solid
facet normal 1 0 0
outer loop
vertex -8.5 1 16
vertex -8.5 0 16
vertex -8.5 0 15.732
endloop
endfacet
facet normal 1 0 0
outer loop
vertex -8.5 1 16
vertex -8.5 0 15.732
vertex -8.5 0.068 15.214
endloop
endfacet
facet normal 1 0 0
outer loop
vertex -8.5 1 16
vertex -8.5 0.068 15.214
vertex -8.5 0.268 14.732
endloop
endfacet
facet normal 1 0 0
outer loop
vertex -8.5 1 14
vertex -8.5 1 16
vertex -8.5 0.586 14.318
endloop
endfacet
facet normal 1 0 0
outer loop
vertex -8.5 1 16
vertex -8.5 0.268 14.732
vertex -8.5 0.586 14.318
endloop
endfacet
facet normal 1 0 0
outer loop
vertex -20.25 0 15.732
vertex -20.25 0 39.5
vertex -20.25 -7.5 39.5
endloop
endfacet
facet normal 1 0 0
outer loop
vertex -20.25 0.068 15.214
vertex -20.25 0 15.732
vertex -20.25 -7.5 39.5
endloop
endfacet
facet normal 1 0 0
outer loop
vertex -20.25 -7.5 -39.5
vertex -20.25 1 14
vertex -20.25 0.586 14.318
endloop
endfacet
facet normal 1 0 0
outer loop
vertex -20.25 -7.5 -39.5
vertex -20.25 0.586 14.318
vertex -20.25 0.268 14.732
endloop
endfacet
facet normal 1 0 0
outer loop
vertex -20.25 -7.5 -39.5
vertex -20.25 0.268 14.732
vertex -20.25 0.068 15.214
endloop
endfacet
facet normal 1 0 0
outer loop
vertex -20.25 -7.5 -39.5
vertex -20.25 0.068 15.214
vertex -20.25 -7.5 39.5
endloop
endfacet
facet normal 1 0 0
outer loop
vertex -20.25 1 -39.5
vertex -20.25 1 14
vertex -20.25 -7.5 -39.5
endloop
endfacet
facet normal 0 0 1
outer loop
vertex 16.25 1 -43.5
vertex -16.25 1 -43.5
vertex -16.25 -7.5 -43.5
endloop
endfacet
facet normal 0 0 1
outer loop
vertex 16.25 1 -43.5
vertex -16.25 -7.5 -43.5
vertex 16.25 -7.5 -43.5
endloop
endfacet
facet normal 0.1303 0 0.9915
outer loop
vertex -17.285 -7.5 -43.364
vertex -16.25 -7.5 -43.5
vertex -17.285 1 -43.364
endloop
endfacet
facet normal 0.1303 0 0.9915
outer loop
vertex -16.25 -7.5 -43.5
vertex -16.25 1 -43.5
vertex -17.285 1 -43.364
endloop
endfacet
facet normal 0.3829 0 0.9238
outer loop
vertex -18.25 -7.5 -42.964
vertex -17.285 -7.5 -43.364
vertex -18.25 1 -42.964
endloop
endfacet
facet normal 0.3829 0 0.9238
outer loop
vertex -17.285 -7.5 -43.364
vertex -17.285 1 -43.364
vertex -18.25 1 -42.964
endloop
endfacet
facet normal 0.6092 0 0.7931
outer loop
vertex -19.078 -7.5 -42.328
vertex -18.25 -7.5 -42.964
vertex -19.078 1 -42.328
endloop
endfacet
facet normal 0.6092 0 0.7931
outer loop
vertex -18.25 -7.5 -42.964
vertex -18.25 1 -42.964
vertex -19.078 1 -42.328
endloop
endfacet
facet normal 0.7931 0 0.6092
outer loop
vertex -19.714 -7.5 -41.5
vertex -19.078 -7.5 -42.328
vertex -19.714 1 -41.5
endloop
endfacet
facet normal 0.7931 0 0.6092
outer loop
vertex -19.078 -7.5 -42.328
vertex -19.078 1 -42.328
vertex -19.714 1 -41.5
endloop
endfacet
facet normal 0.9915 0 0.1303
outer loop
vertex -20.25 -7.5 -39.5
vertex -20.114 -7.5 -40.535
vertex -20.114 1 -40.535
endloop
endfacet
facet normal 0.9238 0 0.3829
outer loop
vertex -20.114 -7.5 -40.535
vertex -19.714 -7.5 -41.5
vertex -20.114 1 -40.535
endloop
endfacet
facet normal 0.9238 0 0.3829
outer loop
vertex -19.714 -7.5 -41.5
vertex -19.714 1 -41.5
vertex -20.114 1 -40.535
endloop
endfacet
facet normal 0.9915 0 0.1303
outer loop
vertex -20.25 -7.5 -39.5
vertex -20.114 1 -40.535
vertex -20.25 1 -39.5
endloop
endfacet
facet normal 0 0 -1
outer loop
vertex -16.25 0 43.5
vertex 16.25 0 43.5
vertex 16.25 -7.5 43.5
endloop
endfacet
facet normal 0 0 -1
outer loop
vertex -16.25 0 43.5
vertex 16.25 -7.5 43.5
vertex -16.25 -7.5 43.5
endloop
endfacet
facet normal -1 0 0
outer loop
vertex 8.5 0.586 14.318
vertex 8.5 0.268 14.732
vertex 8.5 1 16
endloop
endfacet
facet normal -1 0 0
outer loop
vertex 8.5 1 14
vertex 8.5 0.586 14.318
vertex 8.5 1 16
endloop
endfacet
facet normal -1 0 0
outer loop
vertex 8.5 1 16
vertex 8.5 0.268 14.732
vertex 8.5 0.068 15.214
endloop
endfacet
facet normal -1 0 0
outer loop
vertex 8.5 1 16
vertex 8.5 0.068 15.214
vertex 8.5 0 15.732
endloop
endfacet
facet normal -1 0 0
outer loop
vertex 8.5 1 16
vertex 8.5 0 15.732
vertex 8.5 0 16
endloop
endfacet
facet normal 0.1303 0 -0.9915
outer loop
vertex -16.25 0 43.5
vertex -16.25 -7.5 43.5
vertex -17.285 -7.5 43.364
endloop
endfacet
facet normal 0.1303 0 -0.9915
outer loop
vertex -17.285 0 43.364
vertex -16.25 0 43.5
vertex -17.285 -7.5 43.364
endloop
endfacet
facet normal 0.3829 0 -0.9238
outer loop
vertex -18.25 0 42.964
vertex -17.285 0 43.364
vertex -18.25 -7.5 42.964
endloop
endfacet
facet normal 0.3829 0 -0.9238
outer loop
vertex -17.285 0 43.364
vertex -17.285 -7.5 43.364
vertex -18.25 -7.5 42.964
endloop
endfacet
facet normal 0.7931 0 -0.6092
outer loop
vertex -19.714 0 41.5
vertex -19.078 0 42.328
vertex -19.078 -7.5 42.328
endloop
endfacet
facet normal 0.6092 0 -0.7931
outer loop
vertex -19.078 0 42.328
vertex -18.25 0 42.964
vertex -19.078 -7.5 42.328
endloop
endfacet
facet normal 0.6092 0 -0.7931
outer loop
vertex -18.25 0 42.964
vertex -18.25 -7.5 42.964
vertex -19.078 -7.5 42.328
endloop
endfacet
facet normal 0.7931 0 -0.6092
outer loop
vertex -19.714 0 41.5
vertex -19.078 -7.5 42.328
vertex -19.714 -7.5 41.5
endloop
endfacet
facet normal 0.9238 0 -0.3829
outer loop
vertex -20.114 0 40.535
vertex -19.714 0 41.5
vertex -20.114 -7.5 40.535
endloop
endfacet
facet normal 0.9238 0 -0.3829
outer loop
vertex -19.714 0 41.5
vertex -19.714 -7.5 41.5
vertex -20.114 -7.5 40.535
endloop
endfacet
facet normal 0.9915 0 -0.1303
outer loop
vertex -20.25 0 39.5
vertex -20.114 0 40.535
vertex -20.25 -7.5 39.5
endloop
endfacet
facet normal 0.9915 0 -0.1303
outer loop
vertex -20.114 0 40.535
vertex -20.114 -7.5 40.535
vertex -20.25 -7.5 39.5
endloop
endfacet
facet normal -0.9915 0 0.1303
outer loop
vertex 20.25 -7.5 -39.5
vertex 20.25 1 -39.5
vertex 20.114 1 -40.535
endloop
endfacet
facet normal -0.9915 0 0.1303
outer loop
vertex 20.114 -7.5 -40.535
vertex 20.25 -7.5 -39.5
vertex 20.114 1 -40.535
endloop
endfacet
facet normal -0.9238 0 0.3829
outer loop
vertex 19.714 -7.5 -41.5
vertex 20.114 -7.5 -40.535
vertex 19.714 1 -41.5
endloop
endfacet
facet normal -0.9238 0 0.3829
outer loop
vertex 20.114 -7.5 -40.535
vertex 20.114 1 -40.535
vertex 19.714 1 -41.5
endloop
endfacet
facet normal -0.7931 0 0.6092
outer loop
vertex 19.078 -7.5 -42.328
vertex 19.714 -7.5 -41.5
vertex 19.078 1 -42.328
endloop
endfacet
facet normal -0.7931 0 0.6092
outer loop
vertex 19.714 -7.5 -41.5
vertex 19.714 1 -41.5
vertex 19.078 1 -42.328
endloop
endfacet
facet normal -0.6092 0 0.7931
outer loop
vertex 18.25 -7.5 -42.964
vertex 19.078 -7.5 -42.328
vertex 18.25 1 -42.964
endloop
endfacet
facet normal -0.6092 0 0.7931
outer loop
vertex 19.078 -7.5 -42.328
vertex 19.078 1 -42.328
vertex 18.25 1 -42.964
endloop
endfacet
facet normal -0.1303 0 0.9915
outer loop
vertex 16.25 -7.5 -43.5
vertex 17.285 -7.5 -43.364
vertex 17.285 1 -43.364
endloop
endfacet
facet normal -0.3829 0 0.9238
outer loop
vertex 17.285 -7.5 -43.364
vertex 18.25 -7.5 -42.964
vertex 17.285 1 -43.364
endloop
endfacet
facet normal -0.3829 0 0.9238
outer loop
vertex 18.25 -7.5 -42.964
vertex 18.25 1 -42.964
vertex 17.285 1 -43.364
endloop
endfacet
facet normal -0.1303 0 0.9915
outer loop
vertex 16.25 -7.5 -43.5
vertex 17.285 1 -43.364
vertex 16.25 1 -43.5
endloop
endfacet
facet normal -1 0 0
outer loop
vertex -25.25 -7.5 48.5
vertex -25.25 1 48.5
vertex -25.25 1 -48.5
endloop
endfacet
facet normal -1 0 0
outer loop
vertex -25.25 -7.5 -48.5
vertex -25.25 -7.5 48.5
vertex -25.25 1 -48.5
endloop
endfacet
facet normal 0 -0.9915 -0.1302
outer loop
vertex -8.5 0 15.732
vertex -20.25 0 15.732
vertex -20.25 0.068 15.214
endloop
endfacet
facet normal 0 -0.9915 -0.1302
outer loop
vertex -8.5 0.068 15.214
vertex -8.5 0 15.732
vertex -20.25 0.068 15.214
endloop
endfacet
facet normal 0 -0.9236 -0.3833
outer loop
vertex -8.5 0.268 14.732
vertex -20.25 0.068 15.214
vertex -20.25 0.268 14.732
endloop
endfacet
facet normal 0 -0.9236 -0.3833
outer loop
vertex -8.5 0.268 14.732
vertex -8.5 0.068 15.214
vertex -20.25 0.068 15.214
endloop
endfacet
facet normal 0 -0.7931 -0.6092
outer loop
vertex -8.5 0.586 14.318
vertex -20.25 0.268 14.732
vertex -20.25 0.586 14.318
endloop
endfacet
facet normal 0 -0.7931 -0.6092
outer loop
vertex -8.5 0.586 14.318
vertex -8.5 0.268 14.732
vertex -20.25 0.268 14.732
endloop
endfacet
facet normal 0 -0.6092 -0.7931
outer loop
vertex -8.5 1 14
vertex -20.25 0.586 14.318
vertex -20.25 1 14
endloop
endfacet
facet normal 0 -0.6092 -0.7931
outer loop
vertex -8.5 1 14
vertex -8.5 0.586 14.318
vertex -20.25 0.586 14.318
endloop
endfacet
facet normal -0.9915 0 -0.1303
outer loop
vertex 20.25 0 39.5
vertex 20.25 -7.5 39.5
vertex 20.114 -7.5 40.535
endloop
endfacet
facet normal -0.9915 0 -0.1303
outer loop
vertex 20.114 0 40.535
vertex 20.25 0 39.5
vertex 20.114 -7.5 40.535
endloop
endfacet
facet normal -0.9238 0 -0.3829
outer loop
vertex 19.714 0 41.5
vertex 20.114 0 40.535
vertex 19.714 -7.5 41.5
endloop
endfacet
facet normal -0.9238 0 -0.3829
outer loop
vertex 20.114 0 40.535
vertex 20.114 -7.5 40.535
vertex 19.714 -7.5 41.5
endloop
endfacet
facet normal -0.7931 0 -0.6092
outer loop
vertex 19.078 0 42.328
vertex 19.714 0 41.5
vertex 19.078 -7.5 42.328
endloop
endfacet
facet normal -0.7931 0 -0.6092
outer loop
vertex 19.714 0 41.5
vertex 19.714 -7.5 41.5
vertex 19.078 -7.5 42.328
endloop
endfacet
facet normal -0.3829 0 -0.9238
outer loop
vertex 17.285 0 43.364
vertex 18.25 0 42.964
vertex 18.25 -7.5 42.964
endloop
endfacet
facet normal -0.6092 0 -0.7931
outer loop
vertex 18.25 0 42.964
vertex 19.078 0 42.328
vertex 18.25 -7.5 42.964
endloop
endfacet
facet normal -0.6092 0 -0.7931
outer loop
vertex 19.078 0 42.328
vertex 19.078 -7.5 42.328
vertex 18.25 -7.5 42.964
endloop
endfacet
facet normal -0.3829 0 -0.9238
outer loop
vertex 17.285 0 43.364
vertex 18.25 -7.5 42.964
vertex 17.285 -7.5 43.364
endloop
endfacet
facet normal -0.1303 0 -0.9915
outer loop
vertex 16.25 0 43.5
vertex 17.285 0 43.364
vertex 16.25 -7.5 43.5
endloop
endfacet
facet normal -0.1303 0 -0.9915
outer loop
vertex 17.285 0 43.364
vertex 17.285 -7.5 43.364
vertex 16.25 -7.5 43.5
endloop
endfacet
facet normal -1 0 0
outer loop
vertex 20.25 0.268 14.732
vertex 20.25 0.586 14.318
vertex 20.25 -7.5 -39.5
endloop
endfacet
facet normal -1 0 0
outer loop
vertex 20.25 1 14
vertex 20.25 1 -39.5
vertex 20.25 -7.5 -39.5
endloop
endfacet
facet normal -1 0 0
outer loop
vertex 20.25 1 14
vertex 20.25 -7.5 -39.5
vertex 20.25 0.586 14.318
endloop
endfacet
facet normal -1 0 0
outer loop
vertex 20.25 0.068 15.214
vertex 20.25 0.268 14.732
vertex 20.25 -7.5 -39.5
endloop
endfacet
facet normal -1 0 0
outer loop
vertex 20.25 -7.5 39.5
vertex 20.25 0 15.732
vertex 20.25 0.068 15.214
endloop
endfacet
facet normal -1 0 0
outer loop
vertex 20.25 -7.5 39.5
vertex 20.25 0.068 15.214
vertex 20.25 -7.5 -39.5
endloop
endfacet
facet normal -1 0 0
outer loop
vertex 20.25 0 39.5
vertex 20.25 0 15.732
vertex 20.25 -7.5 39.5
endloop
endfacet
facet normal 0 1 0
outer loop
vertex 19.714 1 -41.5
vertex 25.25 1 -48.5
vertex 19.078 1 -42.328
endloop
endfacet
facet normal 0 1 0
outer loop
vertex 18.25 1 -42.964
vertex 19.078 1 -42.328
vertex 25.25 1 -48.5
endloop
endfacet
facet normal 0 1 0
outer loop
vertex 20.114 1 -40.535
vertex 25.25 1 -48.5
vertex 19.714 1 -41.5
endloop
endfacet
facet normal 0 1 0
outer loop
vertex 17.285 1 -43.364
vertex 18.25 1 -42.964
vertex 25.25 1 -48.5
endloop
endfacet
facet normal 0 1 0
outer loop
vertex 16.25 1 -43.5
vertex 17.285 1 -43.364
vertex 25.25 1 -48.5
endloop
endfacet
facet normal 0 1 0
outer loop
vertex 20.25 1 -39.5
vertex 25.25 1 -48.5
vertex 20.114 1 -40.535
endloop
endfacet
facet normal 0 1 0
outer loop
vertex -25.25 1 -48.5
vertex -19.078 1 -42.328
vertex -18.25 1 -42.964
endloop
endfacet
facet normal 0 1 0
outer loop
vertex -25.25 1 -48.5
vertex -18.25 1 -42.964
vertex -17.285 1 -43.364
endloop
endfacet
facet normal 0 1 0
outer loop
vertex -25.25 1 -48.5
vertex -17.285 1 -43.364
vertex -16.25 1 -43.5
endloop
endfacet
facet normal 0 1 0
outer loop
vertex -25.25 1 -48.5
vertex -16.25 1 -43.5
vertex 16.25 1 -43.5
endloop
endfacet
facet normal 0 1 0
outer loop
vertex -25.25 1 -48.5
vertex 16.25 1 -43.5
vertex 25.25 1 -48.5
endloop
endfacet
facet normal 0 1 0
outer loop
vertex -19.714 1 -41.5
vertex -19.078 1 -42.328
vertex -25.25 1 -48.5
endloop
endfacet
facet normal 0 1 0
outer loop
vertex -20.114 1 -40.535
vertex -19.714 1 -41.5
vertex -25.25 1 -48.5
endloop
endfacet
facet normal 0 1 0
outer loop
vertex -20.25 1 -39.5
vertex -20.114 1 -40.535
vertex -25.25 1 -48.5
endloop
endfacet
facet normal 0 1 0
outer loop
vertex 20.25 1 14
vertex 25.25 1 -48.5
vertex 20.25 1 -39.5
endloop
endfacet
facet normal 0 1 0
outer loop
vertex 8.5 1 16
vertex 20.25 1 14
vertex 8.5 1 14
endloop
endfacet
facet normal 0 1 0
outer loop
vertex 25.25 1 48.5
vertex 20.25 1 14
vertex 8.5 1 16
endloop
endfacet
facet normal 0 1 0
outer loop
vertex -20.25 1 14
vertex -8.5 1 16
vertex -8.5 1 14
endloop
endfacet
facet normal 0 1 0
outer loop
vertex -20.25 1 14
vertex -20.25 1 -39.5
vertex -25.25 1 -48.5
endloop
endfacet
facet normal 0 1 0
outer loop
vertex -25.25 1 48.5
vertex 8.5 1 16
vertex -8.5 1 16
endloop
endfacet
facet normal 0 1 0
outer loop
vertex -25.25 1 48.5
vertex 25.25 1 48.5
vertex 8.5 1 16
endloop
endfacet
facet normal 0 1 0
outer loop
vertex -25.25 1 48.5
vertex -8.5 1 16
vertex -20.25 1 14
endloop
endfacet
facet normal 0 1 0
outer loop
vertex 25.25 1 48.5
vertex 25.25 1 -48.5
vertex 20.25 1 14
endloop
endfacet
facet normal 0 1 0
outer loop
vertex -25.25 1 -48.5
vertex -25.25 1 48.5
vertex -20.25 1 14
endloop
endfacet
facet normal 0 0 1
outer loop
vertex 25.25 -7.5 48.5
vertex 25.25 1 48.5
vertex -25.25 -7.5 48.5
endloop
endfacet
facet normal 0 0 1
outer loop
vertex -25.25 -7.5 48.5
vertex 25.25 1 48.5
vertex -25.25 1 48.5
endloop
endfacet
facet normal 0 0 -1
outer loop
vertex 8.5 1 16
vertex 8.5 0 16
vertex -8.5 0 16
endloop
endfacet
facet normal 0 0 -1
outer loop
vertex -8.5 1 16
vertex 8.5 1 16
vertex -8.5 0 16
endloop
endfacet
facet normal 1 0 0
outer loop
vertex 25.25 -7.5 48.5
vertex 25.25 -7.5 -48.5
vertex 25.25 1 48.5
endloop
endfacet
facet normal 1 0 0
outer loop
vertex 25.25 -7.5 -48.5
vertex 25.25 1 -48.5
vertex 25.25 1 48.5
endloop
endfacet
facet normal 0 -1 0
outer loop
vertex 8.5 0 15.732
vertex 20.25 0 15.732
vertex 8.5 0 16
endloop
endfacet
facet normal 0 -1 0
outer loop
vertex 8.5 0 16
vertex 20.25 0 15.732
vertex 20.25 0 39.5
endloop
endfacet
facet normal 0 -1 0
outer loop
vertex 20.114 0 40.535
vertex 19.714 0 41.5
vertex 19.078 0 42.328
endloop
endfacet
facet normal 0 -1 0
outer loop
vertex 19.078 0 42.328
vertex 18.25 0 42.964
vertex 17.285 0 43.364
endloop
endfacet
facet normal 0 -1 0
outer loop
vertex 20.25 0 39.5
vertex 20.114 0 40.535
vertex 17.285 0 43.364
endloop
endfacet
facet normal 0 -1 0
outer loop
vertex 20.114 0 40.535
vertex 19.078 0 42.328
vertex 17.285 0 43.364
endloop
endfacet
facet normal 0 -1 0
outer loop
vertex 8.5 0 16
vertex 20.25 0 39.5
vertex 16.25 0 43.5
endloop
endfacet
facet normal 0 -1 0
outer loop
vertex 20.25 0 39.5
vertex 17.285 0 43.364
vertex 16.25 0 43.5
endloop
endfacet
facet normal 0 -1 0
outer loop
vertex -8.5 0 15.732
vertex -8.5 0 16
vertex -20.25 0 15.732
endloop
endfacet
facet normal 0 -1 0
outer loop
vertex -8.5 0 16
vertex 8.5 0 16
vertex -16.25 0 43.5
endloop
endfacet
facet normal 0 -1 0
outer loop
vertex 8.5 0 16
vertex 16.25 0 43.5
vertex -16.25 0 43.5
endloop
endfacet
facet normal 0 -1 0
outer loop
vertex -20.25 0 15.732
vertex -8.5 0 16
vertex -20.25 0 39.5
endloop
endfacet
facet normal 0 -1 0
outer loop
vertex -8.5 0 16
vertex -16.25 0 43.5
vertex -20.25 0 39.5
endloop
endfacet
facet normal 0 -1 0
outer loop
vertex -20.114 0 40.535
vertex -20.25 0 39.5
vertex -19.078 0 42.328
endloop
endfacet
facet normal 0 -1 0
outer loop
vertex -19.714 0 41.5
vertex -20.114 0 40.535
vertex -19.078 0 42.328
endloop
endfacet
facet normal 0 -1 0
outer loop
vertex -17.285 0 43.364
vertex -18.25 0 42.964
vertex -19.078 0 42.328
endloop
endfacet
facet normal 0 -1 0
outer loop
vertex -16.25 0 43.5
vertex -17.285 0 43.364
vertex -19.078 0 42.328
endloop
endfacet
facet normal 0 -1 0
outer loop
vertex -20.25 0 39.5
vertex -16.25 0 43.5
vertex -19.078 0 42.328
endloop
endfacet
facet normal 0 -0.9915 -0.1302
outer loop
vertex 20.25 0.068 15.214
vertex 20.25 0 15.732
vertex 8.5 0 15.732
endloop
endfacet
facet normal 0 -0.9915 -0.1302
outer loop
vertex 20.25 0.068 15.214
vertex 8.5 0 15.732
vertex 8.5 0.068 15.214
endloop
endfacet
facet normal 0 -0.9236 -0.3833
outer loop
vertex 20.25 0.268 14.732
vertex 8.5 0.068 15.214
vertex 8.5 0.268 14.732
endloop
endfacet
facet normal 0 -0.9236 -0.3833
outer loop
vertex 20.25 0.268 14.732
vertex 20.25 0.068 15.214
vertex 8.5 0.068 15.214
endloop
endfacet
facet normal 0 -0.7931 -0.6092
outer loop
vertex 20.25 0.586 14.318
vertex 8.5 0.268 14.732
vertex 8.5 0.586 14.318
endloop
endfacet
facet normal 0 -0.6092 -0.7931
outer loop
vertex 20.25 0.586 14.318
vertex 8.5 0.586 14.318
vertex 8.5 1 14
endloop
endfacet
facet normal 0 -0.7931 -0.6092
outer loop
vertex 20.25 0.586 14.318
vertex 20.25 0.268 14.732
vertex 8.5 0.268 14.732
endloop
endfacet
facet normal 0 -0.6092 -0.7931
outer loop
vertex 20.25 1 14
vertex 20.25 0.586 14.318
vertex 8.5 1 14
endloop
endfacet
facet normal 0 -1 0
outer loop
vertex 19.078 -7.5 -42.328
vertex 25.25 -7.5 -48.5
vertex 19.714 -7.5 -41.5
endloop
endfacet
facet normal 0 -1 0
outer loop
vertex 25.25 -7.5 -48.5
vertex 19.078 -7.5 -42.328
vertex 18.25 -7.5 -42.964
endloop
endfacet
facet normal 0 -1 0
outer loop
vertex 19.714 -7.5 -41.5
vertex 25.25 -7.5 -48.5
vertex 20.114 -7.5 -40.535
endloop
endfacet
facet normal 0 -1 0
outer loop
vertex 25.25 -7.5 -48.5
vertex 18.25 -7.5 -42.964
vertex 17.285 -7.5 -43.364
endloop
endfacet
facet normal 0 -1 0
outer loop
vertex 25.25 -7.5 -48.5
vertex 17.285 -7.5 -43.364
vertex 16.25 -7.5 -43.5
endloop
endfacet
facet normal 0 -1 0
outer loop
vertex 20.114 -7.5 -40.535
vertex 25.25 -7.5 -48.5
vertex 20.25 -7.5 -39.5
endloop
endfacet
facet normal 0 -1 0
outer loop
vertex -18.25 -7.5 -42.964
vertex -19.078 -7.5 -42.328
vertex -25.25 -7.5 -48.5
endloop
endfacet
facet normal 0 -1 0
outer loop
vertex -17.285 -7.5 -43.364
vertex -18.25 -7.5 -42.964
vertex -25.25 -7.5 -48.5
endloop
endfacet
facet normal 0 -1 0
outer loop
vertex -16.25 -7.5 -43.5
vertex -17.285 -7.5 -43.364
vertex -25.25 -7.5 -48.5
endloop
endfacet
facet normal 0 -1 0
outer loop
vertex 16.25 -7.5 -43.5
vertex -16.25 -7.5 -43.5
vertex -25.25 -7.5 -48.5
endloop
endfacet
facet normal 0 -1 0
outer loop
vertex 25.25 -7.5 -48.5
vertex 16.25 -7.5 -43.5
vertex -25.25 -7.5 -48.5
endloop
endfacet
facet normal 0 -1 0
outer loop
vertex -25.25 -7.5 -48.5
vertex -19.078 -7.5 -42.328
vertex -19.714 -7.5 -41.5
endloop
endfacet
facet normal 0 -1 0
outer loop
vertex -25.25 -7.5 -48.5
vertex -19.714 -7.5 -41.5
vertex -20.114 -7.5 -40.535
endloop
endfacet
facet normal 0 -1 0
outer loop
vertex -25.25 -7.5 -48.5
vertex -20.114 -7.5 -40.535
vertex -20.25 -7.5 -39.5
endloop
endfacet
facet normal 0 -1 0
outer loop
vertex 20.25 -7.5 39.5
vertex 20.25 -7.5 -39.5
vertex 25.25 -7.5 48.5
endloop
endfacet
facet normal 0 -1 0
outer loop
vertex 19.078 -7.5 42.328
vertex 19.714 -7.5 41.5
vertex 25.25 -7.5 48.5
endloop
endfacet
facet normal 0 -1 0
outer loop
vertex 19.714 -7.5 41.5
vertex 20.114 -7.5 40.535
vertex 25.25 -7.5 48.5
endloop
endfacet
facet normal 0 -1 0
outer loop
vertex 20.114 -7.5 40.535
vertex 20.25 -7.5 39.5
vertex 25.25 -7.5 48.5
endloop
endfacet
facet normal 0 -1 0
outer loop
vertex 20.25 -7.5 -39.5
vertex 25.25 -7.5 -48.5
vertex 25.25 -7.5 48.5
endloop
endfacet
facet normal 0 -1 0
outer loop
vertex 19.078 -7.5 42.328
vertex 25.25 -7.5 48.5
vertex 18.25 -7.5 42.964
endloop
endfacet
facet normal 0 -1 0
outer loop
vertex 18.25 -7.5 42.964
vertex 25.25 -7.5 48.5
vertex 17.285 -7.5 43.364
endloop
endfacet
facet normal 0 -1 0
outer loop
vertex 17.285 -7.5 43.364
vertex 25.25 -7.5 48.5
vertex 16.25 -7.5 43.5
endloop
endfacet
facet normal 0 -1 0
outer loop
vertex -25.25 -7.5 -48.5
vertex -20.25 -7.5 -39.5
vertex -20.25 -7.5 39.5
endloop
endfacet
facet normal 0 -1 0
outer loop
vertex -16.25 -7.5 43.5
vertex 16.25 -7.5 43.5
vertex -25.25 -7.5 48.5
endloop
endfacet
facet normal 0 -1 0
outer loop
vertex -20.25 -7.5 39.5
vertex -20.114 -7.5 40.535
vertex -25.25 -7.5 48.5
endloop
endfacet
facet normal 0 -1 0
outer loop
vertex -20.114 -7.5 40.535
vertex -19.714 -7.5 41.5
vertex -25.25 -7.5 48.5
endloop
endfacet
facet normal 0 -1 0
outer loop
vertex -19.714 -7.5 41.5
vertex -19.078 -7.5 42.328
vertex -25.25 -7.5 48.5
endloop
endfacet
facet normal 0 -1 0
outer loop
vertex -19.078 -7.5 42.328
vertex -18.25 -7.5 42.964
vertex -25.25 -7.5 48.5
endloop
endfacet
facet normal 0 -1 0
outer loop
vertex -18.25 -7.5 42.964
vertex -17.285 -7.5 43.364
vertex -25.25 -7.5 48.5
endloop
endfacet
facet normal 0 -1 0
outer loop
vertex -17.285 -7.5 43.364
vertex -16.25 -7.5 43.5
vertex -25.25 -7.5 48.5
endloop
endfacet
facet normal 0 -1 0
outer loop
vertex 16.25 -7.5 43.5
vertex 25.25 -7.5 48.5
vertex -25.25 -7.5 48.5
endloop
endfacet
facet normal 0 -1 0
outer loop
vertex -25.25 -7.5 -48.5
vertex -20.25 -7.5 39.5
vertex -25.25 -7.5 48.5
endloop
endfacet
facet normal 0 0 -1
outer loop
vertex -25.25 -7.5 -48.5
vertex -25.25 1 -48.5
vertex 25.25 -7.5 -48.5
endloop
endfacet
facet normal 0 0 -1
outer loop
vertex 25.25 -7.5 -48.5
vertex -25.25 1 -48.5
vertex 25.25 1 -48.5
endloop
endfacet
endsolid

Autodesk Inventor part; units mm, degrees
ref_plane "YZ Plane" through (0, 0, 0) normal (1, 0, 0) x (0, 1, 0)
ref_plane "XZ Plane" through (0, 0, 0) normal (0, 1, 0) x (-1, 0, 0)
ref_plane "XY Plane" through (0, 0, 0) normal (0, 0, 1) x (1, 0, 0)
sketch "Boceto1" plane through (0, 0, 0) normal (0, 1, 0) x (-1, 0, 0)
  line L0 (20.25, -43.5) -> (-20.25, -43.5)
  line L1 (-20.25, -43.5) -> (-20.25, 43.5)
  line L2 (-20.25, 43.5) -> (20.25, 43.5)
  line L3 (20.25, 43.5) -> (20.25, -43.5)
  line L4 (20.25, -43.5) -> (-20.25, 43.5) construction
  line L5 (-20.25, -43.5) -> (20.25, 43.5) construction
  line L6 (25.25, -48.5) -> (-25.25, -48.5)
  line L7 (-25.25, -48.5) -> (-25.25, 48.5)
  line L8 (-25.25, 48.5) -> (25.25, 48.5)
  line L9 (25.25, 48.5) -> (25.25, -48.5)
  line L10 (20.25, 43.5) -> (-20.25, 43.5)
  line L11 (-20.25, 43.5) -> (-20.25, 14)
  line L12 (-20.25, 14) -> (20.25, 14)
  line L13 (20.25, 14) -> (20.25, 43.5)
  line L14 (25.25, 14) -> (-25.25, 14)
  line L15 (21.25, -44.5) -> (-21.25, -44.5)
  line L16 (-21.25, -44.5) -> (-21.25, 44.5)
  line L17 (-21.25, 44.5) -> (21.25, 44.5)
  line L18 (21.25, 44.5) -> (21.25, -44.5)
  line L19 (8.5, 14) -> (-8.5, 14)
  line L20 (-8.5, 14) -> (-8.5, 16)
  line L21 (-8.5, 16) -> (8.5, 16)
  line L22 (8.5, 16) -> (8.5, 14)
  point P0 (0, 0)
  point P1 (0, 0)
  point P2 (-20.25, 14)
  point P3 (20.25, 14)
  point P4 (-20.25, 14)
  point P5 (0, 14)
  point P6 (-8.5, 14)
  dimension "d0" = 40.5
  dimension "d1" = 87
  dimension "d2" = 5
  dimension "d3" = 29.5
  dimension "d19" = 1
  dimension "d20" = 17
  dimension "d21" = 2
extrude "Extrusión4" add sketch "Boceto1" against normal blind 7.5 contours L3 L14 L18 L15 L16 L1 L0 | L3 L2 L1 L14 L16 L17 L18 | L18 L17 L16 L14 L7 L8 L9 | L14 L9 L6 L7 L16 L15 L18
extrude "Extrusión5" add sketch "Boceto1" along normal blind 1 contours L3 L14 L18 L15 L16 L1 L0 | L12 L22 L21 L20 L1 L2 L3 | L3 L2 L1 L14 L16 L17 L18 | L18 L17 L16 L14 L7 L8 L9 | L14 L9 L6 L7 L16 L15 L18
fillet "Empalme2" radius 4 4 edges at (-20.25, -3.25, -43.5) (20.25, -3.25, -43.5) (20.25, -3.75, 43.5) (-20.25, -3.75, 43.5)
fillet "Empalme3" radius 2 2 edges at (14.375, 0, 14) (-14.375, 0, 14)
properties part number "manija_puerta_marco_front_right_v2"
